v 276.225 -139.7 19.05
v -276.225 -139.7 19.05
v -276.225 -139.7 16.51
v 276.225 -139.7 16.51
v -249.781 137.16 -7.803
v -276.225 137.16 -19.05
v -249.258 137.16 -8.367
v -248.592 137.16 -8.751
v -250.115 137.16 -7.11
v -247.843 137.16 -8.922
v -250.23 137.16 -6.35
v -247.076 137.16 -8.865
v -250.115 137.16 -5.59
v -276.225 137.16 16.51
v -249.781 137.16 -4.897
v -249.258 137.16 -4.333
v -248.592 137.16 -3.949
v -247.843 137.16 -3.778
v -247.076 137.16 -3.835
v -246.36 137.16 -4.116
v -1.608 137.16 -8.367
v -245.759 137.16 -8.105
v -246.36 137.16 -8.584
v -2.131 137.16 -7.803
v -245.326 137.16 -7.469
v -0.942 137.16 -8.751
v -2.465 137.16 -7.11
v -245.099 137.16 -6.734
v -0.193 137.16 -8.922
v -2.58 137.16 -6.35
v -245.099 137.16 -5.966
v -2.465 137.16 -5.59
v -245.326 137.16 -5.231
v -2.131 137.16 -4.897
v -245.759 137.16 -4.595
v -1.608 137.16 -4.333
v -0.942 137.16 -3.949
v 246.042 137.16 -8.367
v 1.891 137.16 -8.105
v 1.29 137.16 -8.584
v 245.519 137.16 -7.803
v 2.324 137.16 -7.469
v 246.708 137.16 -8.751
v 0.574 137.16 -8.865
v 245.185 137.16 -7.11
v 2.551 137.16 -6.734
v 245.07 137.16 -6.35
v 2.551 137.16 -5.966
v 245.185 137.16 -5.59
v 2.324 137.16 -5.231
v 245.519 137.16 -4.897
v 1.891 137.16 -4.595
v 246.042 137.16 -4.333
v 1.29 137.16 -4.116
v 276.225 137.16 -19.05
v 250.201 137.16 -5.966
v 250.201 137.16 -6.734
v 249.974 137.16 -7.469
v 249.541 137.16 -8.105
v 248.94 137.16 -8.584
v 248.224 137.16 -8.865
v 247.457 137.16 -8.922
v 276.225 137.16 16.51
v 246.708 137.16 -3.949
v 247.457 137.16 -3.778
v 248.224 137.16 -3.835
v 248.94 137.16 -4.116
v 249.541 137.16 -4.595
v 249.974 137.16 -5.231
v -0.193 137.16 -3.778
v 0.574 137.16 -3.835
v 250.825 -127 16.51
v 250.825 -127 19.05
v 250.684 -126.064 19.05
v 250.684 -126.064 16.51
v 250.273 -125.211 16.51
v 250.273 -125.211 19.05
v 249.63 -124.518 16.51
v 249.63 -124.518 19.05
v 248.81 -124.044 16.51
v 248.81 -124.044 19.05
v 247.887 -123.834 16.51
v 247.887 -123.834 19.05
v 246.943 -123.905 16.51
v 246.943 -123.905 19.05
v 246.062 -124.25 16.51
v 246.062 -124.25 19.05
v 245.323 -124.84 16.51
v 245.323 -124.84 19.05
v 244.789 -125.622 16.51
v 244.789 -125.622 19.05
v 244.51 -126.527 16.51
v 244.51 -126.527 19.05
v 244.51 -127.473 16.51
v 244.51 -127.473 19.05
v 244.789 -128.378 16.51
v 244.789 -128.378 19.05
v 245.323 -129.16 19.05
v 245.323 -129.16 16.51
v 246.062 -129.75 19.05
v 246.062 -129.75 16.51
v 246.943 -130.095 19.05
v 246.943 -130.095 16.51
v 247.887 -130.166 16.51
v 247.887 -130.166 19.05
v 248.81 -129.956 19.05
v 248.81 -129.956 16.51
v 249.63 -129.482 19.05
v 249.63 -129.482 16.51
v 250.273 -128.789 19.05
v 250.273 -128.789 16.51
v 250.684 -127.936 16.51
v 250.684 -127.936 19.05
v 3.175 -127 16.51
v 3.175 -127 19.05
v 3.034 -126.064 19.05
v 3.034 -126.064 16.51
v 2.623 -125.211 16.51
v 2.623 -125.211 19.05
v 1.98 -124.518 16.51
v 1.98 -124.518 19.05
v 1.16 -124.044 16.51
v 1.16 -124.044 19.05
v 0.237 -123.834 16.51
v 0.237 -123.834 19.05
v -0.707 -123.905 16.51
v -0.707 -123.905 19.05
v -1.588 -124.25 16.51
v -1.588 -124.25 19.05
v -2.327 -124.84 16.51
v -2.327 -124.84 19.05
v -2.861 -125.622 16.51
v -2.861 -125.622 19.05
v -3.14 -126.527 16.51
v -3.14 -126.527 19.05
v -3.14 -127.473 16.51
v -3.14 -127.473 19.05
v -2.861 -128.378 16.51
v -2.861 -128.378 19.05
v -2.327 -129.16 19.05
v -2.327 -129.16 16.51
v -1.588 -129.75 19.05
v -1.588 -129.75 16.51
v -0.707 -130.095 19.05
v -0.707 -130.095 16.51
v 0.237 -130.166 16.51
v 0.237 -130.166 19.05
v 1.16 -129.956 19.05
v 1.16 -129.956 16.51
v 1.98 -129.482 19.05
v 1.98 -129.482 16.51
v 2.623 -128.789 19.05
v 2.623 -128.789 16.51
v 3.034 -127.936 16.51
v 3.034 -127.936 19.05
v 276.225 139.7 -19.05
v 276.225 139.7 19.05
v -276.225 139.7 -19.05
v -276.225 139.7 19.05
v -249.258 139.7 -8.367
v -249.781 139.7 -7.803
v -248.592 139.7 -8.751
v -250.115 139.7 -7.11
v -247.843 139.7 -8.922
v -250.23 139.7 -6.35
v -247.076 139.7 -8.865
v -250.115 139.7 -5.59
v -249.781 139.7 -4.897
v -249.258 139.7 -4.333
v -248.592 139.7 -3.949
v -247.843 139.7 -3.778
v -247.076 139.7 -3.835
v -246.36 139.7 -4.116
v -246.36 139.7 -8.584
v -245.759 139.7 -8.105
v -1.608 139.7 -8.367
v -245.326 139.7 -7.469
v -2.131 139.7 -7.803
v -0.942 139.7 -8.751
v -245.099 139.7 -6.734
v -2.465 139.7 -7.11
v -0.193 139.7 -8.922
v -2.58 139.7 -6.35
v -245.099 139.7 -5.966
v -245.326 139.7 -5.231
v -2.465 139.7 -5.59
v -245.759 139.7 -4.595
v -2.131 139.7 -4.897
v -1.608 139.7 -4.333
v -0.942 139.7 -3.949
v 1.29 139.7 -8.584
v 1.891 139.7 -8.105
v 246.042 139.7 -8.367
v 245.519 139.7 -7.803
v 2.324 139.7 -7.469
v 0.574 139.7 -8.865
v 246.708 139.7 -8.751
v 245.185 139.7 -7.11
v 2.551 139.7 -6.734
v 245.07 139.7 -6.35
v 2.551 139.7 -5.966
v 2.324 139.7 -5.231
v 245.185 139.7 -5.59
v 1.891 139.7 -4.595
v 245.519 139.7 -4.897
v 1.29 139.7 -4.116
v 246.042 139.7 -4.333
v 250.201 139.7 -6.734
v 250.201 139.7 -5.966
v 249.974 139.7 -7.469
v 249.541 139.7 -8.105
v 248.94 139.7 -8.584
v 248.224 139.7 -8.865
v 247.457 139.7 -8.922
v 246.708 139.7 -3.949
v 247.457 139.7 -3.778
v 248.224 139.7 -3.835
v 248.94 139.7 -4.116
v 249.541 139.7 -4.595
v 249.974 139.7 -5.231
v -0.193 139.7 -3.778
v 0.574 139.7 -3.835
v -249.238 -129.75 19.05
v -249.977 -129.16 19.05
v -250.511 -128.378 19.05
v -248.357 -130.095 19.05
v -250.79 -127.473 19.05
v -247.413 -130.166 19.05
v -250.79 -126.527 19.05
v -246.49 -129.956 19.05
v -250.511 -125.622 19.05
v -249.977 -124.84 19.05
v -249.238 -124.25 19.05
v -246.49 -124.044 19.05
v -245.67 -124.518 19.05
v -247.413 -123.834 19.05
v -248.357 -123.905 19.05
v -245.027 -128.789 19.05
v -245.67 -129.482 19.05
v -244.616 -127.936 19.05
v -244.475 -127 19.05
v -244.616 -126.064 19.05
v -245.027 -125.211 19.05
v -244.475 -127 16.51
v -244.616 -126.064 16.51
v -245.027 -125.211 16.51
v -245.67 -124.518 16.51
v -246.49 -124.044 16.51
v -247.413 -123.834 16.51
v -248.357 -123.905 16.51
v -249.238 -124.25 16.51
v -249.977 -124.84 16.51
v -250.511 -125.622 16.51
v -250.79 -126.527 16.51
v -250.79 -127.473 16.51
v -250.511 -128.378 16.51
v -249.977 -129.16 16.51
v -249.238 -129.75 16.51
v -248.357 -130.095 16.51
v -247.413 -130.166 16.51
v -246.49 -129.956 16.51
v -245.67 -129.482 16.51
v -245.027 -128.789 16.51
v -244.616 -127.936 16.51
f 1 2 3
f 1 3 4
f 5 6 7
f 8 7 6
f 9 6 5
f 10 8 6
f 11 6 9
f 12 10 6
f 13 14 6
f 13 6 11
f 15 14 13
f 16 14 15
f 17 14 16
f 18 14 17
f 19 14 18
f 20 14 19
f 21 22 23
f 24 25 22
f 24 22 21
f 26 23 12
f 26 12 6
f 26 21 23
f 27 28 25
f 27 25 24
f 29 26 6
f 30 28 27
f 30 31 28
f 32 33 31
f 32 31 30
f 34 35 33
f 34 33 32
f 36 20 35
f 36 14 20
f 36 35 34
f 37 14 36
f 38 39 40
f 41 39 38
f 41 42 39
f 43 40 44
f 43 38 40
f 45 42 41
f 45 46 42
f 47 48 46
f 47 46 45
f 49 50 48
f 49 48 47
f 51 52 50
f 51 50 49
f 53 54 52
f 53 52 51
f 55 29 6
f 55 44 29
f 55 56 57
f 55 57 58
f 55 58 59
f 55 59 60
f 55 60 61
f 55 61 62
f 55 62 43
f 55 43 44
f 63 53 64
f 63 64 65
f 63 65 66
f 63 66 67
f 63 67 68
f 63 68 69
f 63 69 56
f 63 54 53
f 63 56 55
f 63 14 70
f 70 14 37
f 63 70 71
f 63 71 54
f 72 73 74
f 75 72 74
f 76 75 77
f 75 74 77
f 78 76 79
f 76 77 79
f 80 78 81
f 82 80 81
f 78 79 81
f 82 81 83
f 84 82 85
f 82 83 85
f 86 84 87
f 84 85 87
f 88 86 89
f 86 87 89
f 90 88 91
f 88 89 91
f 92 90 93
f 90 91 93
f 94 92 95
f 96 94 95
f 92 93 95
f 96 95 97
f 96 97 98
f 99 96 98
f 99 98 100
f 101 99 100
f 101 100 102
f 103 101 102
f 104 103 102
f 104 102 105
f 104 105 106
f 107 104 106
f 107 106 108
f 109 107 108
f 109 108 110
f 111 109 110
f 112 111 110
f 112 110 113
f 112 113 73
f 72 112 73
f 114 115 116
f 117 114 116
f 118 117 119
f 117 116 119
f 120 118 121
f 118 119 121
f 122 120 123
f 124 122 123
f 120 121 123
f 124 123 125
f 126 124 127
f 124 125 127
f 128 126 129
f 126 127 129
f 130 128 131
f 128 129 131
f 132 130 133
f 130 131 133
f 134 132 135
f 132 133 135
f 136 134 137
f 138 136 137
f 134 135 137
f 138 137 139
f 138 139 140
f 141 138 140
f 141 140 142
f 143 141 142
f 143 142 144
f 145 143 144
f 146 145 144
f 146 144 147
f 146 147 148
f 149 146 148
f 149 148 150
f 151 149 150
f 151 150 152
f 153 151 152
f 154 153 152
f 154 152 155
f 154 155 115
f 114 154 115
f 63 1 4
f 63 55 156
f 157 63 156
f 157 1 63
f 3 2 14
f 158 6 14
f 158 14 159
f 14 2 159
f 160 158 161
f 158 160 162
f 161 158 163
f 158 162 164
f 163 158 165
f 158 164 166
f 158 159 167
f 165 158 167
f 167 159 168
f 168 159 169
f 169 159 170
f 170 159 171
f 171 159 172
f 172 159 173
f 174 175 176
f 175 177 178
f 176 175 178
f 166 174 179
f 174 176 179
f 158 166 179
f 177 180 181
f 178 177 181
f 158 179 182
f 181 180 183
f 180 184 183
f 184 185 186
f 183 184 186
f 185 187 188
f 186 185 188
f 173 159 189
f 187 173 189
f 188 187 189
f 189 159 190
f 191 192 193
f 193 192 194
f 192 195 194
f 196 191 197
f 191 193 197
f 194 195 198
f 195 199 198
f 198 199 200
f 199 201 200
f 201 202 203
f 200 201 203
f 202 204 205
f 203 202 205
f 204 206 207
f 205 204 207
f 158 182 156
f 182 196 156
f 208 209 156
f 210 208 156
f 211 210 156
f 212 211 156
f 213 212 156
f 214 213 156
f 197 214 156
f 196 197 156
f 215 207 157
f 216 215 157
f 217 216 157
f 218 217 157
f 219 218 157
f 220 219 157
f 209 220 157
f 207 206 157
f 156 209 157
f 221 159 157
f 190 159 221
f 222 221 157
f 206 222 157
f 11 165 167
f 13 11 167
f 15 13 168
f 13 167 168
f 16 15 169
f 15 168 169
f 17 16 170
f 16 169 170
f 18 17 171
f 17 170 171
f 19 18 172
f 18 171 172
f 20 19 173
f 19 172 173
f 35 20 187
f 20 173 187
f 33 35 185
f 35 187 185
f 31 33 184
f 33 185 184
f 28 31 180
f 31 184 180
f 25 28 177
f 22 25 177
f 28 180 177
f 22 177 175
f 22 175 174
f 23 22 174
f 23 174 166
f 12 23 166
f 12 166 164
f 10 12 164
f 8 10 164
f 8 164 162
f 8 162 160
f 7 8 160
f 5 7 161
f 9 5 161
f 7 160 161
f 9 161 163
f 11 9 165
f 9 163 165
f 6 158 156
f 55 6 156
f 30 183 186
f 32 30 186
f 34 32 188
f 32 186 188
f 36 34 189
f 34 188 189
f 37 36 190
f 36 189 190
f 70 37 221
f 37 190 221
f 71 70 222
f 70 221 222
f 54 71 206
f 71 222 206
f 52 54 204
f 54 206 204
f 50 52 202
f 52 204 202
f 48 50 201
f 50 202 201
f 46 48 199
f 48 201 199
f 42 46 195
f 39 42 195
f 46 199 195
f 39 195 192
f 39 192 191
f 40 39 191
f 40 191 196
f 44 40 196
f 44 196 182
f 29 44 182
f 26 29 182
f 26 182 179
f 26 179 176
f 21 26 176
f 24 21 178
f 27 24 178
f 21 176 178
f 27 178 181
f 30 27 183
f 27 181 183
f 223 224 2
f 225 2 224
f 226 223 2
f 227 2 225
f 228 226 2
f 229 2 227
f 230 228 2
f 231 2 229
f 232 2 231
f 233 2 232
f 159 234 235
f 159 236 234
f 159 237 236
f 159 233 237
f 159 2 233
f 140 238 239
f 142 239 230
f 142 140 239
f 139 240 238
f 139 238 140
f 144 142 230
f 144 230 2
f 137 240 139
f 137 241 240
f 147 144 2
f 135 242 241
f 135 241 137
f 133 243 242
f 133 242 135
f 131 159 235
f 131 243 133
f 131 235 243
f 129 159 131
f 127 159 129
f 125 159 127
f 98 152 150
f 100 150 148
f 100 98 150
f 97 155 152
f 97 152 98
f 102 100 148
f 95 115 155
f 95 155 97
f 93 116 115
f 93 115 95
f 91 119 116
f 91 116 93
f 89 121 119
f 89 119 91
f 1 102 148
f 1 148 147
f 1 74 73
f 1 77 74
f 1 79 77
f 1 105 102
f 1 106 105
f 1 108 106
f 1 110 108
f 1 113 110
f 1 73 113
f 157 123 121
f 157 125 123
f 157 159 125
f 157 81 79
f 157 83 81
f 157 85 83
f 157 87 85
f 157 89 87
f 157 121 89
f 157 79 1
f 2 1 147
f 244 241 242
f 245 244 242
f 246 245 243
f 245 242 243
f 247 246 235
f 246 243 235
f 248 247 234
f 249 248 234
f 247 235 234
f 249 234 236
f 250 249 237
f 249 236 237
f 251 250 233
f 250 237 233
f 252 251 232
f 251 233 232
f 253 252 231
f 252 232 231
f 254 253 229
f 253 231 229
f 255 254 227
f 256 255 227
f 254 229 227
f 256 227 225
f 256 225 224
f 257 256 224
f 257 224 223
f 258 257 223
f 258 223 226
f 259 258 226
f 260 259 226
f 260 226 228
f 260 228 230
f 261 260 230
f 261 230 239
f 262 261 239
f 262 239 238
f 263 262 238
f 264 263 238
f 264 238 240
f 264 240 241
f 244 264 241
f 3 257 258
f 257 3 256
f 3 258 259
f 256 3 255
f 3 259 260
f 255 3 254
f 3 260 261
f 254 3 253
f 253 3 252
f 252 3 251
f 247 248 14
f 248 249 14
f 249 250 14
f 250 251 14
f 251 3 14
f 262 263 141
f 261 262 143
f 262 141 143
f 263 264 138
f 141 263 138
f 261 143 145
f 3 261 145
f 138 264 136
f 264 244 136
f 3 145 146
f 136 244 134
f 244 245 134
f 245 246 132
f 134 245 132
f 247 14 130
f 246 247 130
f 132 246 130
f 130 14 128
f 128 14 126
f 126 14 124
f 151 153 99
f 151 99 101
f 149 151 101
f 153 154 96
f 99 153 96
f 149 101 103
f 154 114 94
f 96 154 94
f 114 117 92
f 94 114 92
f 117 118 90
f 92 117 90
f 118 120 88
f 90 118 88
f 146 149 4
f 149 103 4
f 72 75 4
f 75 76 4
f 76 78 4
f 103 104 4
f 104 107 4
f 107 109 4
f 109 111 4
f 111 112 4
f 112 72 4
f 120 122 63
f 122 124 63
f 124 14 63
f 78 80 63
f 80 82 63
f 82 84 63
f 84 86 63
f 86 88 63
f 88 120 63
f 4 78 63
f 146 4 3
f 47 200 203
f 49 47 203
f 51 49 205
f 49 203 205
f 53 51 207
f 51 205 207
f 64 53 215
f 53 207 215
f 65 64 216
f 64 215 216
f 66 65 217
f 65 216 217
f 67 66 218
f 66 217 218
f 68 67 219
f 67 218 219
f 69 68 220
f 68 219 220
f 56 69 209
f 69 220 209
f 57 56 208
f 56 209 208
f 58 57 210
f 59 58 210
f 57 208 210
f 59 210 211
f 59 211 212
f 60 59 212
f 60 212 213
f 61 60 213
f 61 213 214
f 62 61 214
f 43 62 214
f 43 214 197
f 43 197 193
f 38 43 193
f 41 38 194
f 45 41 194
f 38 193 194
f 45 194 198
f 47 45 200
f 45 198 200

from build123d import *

# Parameters (mm, degrees)
F0_W     = 552.45
F0_H     = 279.4
F1_DEPTH = 19.05
F2_T     = -2.54
F3_R     = 2.5796875
F4_DEPTH = 2.54
F5_R     = 3.175
F6_DEPTH = 38.101


with BuildPart() as f1:
    # F0 (on Top) → F1 (new body, symmetric)
    with BuildSketch(Plane.XY):
        Rectangle(F0_W, F0_H)
    extrude(amount=F1_DEPTH, both=True)

    # F2
    f2_openings = [f1.faces().sort_by_distance(p)[0] for p in [
        (0, -139.7, 0),
        (-276.225, 0, 0),
        (0, 0, -19.05),
        (276.225, 0, 0),
    ]]
    offset(amount=F2_T, openings=f2_openings)

    # F3 (on face) → F4 (cut, through all)
    with BuildSketch(Plane(origin=(0, 139.7, 0), x_dir=(-1, 0, 0), z_dir=(0, 1, 0))):
        with Locations((-247.65, -6.35)):
            Circle(F3_R)
        with Locations((0, -6.35)):
            Circle(F3_R)
        with Locations((247.65, -6.35)):
            Circle(F3_R)
    extrude(amount=-F4_DEPTH, mode=Mode.SUBTRACT)

    # F5 (on face) → F6 (cut, through all)
    with BuildSketch(Plane.XY.offset(19.05)):
        with Locations((-247.65, -127)):
            Circle(F5_R)
        with Locations((0, -127)):
            Circle(F5_R)
        with Locations((247.65, -127)):
            Circle(F5_R)
    extrude(amount=-F6_DEPTH, mode=Mode.SUBTRACT)


solid = f1.part
